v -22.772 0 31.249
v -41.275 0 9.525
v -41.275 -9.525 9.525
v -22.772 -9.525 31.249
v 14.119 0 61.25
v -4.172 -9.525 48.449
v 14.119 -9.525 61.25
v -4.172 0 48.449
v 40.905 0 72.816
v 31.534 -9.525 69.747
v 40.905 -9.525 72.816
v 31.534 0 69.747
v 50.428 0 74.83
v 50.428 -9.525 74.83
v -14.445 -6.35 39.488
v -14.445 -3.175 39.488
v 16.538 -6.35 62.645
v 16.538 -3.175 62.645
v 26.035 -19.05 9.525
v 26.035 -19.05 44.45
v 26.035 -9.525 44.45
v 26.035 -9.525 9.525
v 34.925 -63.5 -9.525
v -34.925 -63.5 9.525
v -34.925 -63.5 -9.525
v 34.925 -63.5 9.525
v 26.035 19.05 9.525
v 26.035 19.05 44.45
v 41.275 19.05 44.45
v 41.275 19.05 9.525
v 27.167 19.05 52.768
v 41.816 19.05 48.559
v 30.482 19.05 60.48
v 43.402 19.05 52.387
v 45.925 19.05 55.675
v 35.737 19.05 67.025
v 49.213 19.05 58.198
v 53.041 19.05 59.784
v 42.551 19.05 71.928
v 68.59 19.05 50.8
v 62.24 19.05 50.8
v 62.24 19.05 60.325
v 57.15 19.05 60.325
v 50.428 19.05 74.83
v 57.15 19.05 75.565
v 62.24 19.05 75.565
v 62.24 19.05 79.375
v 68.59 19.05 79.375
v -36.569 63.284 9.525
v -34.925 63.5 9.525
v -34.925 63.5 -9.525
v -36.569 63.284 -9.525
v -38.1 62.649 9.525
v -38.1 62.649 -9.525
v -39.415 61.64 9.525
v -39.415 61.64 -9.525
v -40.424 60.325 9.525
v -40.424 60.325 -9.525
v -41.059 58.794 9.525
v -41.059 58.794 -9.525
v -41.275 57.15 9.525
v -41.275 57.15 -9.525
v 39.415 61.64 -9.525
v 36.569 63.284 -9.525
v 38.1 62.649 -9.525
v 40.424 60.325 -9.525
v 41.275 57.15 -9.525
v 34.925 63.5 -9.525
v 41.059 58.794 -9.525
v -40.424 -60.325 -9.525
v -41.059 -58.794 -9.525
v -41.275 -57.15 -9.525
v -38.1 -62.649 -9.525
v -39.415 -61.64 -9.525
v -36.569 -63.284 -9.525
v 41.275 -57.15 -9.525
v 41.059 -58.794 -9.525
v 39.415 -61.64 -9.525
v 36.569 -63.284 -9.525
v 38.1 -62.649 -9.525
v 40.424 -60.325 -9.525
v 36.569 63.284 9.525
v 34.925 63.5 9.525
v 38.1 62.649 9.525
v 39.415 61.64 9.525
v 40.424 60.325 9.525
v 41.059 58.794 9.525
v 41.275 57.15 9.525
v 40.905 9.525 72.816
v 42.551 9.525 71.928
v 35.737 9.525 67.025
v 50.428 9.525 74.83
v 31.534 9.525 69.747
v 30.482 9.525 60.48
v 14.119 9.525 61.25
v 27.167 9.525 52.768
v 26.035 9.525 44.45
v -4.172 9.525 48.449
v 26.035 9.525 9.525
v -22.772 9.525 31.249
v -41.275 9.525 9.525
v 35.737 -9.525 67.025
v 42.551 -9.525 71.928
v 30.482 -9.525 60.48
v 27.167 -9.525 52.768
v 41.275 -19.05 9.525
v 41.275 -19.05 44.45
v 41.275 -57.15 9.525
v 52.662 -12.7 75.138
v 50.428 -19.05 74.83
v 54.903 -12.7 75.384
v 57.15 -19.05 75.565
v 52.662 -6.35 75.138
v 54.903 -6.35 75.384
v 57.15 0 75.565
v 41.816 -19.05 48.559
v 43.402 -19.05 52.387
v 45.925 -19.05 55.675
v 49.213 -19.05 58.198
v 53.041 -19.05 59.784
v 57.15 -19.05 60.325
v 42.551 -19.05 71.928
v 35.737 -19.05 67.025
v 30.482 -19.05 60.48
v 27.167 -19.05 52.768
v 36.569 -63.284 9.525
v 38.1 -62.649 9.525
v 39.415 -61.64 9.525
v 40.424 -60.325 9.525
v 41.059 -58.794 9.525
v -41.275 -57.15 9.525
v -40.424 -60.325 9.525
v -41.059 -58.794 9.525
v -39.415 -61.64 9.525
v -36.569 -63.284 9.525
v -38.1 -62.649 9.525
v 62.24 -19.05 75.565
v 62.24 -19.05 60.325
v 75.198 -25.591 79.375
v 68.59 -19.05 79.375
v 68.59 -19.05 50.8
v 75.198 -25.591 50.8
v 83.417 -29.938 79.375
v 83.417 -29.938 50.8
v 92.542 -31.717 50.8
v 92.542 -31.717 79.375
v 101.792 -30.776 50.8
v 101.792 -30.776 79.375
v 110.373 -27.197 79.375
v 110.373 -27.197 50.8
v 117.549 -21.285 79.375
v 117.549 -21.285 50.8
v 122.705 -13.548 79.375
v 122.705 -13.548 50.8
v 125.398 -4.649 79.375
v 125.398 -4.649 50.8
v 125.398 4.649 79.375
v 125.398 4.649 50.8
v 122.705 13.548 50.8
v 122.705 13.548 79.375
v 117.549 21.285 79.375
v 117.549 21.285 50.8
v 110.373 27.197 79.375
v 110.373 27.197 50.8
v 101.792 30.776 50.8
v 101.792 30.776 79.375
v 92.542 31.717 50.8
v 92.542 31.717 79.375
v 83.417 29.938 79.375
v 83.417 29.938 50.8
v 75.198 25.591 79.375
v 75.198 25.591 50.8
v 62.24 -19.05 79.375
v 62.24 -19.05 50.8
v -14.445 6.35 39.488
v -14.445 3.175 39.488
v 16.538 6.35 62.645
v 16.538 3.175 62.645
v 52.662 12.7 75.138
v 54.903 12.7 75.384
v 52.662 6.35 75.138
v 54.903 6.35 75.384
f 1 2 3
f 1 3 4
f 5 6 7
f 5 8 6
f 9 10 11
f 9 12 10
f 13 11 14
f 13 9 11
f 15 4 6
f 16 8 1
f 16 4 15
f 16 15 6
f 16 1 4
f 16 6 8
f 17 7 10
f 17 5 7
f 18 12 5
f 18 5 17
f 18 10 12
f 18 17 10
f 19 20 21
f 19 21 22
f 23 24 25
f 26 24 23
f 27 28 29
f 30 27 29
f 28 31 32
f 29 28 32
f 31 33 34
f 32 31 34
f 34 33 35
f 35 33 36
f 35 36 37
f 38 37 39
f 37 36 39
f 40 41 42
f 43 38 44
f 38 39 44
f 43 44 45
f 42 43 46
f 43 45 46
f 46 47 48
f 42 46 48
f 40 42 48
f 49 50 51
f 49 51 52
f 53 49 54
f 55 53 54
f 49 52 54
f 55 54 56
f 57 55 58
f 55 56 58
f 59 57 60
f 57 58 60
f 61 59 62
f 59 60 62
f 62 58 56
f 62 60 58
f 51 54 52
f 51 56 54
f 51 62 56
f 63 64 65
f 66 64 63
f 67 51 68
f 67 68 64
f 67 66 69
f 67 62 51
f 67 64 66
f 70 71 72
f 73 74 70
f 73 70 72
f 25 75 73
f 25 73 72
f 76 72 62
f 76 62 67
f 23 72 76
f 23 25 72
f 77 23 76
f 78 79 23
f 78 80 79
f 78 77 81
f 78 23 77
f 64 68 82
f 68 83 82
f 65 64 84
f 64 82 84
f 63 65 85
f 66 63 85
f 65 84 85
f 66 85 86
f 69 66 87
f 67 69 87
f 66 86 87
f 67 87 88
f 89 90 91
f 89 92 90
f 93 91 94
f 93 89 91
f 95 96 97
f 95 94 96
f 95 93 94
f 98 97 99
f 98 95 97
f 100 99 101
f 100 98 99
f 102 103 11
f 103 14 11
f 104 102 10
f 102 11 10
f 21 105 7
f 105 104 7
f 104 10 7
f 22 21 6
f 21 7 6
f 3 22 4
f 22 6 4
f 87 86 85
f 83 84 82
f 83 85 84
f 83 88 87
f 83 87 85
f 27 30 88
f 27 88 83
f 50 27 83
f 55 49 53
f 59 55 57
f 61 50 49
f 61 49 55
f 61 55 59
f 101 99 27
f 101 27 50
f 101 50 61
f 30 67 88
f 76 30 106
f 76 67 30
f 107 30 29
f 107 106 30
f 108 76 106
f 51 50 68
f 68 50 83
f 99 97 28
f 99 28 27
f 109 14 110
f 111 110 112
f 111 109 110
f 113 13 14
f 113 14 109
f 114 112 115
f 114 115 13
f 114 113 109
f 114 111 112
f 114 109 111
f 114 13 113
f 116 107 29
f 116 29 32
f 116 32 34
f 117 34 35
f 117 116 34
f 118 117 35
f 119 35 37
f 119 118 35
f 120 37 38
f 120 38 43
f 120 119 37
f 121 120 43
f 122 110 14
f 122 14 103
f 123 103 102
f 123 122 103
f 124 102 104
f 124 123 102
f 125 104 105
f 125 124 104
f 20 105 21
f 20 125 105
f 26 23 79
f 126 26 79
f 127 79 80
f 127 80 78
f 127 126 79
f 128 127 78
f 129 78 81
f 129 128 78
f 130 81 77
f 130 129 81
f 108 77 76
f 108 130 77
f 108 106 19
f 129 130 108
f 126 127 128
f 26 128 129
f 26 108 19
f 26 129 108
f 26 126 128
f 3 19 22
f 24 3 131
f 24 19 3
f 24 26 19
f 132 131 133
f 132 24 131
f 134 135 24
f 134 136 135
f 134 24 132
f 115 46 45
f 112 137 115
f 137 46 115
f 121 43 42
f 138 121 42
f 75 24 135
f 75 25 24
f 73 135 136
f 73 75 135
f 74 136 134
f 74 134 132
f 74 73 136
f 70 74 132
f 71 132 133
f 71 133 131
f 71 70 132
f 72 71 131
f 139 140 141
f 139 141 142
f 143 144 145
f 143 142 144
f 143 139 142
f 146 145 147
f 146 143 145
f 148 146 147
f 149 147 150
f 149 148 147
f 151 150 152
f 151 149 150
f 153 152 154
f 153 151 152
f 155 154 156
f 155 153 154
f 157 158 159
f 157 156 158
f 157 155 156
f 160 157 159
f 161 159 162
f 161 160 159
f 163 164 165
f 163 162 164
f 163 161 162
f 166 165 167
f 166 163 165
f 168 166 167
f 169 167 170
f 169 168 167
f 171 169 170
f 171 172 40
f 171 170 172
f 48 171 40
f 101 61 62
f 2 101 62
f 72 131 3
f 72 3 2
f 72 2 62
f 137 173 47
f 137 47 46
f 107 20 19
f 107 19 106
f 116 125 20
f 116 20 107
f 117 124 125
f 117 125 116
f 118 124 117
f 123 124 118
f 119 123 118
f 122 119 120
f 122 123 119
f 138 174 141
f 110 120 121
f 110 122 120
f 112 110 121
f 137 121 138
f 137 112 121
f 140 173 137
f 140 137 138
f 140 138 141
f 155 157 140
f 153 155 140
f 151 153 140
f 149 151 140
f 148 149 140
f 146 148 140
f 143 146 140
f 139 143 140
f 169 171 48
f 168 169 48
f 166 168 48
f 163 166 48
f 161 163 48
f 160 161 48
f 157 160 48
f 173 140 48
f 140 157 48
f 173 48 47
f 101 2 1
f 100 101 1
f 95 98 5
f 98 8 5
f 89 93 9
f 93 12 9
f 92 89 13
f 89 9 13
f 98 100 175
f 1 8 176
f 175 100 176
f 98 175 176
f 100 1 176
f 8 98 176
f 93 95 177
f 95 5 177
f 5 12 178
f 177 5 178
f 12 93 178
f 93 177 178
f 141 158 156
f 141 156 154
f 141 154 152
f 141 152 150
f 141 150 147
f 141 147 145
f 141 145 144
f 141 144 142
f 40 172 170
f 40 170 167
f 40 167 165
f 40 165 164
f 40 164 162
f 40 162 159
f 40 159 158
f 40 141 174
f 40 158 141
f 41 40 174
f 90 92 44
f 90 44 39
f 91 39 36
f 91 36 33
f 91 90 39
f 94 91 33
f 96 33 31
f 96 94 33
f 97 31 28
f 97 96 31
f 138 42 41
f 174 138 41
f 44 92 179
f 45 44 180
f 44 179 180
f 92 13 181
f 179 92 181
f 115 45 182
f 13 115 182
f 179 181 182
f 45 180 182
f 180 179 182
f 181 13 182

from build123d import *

# Parameters (mm, degrees)
F1_DEPTH = 63.5
F2_DEPTH = 9.525
F3_DEPTH = 19.05
F0_W     = 31.75
F0_H     = 28.575
F5_R     = 6.35


with BuildPart() as f1:
    # F0 (on Front) → F1 (new body, symmetric)
    with BuildSketch(Plane.XZ):
        Polygon((26.035, 9.525), (-41.275, 9.525), (-41.275, -9.525), (41.275, -9.525), (41.275, 9.525), align=None)
    extrude(amount=F1_DEPTH, both=True)

    # F0 (on Front) → F2 (join, symmetric)
    with BuildSketch(Plane.XZ):
        with BuildLine():
            add(Edge.make_bspline(
                [(-41.275, 9.525), (-16.936806, 41.503267), (15.500731, 69.51972), (50.427763, 74.83017)],
                knots=[0, 0, 0, 0, 111.410759, 111.410759, 111.410759, 111.410759], degree=3))
            Line((-41.275, 9.525), (26.035, 9.525))
            Line((26.035, 9.525), (26.035, 44.45))
            ThreePointArc((26.035, 44.45), (32.887831, 63.930513), (50.427763, 74.83017))
        make_face()
    extrude(amount=F2_DEPTH, both=True)

    # F0 (on Front) → F3 (join, symmetric)
    with BuildSketch(Plane.XZ):
        with BuildLine():
            Line((26.035, 44.45), (26.035, 9.525))
            Line((26.035, 9.525), (41.275, 9.525))
            Line((41.275, 9.525), (41.275, 44.45))
            ThreePointArc((41.275, 44.45), (45.92468, 55.67532), (57.15, 60.325))
            Line((57.15, 60.325), (62.24008, 60.325))
            Line((62.24008, 60.325), (62.24008, 75.565))
            Line((62.24008, 75.565), (57.15, 75.565))
            add(Edge.make_bspline(
                [(50.427763, 74.83017), (52.658838, 75.169392), (54.900071, 75.415964), (57.15, 75.565)],
                knots=[111.410759, 111.410759, 111.410759, 111.410759, 118.527475, 118.527475, 118.527475, 118.527475], degree=3))
            ThreePointArc((50.427763, 74.83017), (32.887831, 63.930513), (26.035, 44.45))
        make_face()
        Polygon((62.24008, 79.375), (62.24008, 75.565), (62.24008, 60.325), (62.24008, 50.8), (93.99008, 50.8), (93.99008, 79.375), align=None)
    extrude(amount=F3_DEPTH, both=True)

    # F0 (on Front) → F4 (revolve)
    with BuildSketch(Plane.XZ):
        with Locations((109.86508, 65.0875)):
            Rectangle(F0_W, F0_H)
    revolve(axis=Axis((93.99008, 0, 65.0875), (0, 0, 1)))

    # F5
    f5_edges = [f1.edges().sort_by_distance(p)[0] for p in [
        (41.275, 63.5, 0),
        (-41.275, 63.5, 0),
        (41.275, -63.5, 0),
        (-41.275, -63.5, 0),
    ]]
    fillet(f5_edges, radius=F5_R)


solid = f1.part
